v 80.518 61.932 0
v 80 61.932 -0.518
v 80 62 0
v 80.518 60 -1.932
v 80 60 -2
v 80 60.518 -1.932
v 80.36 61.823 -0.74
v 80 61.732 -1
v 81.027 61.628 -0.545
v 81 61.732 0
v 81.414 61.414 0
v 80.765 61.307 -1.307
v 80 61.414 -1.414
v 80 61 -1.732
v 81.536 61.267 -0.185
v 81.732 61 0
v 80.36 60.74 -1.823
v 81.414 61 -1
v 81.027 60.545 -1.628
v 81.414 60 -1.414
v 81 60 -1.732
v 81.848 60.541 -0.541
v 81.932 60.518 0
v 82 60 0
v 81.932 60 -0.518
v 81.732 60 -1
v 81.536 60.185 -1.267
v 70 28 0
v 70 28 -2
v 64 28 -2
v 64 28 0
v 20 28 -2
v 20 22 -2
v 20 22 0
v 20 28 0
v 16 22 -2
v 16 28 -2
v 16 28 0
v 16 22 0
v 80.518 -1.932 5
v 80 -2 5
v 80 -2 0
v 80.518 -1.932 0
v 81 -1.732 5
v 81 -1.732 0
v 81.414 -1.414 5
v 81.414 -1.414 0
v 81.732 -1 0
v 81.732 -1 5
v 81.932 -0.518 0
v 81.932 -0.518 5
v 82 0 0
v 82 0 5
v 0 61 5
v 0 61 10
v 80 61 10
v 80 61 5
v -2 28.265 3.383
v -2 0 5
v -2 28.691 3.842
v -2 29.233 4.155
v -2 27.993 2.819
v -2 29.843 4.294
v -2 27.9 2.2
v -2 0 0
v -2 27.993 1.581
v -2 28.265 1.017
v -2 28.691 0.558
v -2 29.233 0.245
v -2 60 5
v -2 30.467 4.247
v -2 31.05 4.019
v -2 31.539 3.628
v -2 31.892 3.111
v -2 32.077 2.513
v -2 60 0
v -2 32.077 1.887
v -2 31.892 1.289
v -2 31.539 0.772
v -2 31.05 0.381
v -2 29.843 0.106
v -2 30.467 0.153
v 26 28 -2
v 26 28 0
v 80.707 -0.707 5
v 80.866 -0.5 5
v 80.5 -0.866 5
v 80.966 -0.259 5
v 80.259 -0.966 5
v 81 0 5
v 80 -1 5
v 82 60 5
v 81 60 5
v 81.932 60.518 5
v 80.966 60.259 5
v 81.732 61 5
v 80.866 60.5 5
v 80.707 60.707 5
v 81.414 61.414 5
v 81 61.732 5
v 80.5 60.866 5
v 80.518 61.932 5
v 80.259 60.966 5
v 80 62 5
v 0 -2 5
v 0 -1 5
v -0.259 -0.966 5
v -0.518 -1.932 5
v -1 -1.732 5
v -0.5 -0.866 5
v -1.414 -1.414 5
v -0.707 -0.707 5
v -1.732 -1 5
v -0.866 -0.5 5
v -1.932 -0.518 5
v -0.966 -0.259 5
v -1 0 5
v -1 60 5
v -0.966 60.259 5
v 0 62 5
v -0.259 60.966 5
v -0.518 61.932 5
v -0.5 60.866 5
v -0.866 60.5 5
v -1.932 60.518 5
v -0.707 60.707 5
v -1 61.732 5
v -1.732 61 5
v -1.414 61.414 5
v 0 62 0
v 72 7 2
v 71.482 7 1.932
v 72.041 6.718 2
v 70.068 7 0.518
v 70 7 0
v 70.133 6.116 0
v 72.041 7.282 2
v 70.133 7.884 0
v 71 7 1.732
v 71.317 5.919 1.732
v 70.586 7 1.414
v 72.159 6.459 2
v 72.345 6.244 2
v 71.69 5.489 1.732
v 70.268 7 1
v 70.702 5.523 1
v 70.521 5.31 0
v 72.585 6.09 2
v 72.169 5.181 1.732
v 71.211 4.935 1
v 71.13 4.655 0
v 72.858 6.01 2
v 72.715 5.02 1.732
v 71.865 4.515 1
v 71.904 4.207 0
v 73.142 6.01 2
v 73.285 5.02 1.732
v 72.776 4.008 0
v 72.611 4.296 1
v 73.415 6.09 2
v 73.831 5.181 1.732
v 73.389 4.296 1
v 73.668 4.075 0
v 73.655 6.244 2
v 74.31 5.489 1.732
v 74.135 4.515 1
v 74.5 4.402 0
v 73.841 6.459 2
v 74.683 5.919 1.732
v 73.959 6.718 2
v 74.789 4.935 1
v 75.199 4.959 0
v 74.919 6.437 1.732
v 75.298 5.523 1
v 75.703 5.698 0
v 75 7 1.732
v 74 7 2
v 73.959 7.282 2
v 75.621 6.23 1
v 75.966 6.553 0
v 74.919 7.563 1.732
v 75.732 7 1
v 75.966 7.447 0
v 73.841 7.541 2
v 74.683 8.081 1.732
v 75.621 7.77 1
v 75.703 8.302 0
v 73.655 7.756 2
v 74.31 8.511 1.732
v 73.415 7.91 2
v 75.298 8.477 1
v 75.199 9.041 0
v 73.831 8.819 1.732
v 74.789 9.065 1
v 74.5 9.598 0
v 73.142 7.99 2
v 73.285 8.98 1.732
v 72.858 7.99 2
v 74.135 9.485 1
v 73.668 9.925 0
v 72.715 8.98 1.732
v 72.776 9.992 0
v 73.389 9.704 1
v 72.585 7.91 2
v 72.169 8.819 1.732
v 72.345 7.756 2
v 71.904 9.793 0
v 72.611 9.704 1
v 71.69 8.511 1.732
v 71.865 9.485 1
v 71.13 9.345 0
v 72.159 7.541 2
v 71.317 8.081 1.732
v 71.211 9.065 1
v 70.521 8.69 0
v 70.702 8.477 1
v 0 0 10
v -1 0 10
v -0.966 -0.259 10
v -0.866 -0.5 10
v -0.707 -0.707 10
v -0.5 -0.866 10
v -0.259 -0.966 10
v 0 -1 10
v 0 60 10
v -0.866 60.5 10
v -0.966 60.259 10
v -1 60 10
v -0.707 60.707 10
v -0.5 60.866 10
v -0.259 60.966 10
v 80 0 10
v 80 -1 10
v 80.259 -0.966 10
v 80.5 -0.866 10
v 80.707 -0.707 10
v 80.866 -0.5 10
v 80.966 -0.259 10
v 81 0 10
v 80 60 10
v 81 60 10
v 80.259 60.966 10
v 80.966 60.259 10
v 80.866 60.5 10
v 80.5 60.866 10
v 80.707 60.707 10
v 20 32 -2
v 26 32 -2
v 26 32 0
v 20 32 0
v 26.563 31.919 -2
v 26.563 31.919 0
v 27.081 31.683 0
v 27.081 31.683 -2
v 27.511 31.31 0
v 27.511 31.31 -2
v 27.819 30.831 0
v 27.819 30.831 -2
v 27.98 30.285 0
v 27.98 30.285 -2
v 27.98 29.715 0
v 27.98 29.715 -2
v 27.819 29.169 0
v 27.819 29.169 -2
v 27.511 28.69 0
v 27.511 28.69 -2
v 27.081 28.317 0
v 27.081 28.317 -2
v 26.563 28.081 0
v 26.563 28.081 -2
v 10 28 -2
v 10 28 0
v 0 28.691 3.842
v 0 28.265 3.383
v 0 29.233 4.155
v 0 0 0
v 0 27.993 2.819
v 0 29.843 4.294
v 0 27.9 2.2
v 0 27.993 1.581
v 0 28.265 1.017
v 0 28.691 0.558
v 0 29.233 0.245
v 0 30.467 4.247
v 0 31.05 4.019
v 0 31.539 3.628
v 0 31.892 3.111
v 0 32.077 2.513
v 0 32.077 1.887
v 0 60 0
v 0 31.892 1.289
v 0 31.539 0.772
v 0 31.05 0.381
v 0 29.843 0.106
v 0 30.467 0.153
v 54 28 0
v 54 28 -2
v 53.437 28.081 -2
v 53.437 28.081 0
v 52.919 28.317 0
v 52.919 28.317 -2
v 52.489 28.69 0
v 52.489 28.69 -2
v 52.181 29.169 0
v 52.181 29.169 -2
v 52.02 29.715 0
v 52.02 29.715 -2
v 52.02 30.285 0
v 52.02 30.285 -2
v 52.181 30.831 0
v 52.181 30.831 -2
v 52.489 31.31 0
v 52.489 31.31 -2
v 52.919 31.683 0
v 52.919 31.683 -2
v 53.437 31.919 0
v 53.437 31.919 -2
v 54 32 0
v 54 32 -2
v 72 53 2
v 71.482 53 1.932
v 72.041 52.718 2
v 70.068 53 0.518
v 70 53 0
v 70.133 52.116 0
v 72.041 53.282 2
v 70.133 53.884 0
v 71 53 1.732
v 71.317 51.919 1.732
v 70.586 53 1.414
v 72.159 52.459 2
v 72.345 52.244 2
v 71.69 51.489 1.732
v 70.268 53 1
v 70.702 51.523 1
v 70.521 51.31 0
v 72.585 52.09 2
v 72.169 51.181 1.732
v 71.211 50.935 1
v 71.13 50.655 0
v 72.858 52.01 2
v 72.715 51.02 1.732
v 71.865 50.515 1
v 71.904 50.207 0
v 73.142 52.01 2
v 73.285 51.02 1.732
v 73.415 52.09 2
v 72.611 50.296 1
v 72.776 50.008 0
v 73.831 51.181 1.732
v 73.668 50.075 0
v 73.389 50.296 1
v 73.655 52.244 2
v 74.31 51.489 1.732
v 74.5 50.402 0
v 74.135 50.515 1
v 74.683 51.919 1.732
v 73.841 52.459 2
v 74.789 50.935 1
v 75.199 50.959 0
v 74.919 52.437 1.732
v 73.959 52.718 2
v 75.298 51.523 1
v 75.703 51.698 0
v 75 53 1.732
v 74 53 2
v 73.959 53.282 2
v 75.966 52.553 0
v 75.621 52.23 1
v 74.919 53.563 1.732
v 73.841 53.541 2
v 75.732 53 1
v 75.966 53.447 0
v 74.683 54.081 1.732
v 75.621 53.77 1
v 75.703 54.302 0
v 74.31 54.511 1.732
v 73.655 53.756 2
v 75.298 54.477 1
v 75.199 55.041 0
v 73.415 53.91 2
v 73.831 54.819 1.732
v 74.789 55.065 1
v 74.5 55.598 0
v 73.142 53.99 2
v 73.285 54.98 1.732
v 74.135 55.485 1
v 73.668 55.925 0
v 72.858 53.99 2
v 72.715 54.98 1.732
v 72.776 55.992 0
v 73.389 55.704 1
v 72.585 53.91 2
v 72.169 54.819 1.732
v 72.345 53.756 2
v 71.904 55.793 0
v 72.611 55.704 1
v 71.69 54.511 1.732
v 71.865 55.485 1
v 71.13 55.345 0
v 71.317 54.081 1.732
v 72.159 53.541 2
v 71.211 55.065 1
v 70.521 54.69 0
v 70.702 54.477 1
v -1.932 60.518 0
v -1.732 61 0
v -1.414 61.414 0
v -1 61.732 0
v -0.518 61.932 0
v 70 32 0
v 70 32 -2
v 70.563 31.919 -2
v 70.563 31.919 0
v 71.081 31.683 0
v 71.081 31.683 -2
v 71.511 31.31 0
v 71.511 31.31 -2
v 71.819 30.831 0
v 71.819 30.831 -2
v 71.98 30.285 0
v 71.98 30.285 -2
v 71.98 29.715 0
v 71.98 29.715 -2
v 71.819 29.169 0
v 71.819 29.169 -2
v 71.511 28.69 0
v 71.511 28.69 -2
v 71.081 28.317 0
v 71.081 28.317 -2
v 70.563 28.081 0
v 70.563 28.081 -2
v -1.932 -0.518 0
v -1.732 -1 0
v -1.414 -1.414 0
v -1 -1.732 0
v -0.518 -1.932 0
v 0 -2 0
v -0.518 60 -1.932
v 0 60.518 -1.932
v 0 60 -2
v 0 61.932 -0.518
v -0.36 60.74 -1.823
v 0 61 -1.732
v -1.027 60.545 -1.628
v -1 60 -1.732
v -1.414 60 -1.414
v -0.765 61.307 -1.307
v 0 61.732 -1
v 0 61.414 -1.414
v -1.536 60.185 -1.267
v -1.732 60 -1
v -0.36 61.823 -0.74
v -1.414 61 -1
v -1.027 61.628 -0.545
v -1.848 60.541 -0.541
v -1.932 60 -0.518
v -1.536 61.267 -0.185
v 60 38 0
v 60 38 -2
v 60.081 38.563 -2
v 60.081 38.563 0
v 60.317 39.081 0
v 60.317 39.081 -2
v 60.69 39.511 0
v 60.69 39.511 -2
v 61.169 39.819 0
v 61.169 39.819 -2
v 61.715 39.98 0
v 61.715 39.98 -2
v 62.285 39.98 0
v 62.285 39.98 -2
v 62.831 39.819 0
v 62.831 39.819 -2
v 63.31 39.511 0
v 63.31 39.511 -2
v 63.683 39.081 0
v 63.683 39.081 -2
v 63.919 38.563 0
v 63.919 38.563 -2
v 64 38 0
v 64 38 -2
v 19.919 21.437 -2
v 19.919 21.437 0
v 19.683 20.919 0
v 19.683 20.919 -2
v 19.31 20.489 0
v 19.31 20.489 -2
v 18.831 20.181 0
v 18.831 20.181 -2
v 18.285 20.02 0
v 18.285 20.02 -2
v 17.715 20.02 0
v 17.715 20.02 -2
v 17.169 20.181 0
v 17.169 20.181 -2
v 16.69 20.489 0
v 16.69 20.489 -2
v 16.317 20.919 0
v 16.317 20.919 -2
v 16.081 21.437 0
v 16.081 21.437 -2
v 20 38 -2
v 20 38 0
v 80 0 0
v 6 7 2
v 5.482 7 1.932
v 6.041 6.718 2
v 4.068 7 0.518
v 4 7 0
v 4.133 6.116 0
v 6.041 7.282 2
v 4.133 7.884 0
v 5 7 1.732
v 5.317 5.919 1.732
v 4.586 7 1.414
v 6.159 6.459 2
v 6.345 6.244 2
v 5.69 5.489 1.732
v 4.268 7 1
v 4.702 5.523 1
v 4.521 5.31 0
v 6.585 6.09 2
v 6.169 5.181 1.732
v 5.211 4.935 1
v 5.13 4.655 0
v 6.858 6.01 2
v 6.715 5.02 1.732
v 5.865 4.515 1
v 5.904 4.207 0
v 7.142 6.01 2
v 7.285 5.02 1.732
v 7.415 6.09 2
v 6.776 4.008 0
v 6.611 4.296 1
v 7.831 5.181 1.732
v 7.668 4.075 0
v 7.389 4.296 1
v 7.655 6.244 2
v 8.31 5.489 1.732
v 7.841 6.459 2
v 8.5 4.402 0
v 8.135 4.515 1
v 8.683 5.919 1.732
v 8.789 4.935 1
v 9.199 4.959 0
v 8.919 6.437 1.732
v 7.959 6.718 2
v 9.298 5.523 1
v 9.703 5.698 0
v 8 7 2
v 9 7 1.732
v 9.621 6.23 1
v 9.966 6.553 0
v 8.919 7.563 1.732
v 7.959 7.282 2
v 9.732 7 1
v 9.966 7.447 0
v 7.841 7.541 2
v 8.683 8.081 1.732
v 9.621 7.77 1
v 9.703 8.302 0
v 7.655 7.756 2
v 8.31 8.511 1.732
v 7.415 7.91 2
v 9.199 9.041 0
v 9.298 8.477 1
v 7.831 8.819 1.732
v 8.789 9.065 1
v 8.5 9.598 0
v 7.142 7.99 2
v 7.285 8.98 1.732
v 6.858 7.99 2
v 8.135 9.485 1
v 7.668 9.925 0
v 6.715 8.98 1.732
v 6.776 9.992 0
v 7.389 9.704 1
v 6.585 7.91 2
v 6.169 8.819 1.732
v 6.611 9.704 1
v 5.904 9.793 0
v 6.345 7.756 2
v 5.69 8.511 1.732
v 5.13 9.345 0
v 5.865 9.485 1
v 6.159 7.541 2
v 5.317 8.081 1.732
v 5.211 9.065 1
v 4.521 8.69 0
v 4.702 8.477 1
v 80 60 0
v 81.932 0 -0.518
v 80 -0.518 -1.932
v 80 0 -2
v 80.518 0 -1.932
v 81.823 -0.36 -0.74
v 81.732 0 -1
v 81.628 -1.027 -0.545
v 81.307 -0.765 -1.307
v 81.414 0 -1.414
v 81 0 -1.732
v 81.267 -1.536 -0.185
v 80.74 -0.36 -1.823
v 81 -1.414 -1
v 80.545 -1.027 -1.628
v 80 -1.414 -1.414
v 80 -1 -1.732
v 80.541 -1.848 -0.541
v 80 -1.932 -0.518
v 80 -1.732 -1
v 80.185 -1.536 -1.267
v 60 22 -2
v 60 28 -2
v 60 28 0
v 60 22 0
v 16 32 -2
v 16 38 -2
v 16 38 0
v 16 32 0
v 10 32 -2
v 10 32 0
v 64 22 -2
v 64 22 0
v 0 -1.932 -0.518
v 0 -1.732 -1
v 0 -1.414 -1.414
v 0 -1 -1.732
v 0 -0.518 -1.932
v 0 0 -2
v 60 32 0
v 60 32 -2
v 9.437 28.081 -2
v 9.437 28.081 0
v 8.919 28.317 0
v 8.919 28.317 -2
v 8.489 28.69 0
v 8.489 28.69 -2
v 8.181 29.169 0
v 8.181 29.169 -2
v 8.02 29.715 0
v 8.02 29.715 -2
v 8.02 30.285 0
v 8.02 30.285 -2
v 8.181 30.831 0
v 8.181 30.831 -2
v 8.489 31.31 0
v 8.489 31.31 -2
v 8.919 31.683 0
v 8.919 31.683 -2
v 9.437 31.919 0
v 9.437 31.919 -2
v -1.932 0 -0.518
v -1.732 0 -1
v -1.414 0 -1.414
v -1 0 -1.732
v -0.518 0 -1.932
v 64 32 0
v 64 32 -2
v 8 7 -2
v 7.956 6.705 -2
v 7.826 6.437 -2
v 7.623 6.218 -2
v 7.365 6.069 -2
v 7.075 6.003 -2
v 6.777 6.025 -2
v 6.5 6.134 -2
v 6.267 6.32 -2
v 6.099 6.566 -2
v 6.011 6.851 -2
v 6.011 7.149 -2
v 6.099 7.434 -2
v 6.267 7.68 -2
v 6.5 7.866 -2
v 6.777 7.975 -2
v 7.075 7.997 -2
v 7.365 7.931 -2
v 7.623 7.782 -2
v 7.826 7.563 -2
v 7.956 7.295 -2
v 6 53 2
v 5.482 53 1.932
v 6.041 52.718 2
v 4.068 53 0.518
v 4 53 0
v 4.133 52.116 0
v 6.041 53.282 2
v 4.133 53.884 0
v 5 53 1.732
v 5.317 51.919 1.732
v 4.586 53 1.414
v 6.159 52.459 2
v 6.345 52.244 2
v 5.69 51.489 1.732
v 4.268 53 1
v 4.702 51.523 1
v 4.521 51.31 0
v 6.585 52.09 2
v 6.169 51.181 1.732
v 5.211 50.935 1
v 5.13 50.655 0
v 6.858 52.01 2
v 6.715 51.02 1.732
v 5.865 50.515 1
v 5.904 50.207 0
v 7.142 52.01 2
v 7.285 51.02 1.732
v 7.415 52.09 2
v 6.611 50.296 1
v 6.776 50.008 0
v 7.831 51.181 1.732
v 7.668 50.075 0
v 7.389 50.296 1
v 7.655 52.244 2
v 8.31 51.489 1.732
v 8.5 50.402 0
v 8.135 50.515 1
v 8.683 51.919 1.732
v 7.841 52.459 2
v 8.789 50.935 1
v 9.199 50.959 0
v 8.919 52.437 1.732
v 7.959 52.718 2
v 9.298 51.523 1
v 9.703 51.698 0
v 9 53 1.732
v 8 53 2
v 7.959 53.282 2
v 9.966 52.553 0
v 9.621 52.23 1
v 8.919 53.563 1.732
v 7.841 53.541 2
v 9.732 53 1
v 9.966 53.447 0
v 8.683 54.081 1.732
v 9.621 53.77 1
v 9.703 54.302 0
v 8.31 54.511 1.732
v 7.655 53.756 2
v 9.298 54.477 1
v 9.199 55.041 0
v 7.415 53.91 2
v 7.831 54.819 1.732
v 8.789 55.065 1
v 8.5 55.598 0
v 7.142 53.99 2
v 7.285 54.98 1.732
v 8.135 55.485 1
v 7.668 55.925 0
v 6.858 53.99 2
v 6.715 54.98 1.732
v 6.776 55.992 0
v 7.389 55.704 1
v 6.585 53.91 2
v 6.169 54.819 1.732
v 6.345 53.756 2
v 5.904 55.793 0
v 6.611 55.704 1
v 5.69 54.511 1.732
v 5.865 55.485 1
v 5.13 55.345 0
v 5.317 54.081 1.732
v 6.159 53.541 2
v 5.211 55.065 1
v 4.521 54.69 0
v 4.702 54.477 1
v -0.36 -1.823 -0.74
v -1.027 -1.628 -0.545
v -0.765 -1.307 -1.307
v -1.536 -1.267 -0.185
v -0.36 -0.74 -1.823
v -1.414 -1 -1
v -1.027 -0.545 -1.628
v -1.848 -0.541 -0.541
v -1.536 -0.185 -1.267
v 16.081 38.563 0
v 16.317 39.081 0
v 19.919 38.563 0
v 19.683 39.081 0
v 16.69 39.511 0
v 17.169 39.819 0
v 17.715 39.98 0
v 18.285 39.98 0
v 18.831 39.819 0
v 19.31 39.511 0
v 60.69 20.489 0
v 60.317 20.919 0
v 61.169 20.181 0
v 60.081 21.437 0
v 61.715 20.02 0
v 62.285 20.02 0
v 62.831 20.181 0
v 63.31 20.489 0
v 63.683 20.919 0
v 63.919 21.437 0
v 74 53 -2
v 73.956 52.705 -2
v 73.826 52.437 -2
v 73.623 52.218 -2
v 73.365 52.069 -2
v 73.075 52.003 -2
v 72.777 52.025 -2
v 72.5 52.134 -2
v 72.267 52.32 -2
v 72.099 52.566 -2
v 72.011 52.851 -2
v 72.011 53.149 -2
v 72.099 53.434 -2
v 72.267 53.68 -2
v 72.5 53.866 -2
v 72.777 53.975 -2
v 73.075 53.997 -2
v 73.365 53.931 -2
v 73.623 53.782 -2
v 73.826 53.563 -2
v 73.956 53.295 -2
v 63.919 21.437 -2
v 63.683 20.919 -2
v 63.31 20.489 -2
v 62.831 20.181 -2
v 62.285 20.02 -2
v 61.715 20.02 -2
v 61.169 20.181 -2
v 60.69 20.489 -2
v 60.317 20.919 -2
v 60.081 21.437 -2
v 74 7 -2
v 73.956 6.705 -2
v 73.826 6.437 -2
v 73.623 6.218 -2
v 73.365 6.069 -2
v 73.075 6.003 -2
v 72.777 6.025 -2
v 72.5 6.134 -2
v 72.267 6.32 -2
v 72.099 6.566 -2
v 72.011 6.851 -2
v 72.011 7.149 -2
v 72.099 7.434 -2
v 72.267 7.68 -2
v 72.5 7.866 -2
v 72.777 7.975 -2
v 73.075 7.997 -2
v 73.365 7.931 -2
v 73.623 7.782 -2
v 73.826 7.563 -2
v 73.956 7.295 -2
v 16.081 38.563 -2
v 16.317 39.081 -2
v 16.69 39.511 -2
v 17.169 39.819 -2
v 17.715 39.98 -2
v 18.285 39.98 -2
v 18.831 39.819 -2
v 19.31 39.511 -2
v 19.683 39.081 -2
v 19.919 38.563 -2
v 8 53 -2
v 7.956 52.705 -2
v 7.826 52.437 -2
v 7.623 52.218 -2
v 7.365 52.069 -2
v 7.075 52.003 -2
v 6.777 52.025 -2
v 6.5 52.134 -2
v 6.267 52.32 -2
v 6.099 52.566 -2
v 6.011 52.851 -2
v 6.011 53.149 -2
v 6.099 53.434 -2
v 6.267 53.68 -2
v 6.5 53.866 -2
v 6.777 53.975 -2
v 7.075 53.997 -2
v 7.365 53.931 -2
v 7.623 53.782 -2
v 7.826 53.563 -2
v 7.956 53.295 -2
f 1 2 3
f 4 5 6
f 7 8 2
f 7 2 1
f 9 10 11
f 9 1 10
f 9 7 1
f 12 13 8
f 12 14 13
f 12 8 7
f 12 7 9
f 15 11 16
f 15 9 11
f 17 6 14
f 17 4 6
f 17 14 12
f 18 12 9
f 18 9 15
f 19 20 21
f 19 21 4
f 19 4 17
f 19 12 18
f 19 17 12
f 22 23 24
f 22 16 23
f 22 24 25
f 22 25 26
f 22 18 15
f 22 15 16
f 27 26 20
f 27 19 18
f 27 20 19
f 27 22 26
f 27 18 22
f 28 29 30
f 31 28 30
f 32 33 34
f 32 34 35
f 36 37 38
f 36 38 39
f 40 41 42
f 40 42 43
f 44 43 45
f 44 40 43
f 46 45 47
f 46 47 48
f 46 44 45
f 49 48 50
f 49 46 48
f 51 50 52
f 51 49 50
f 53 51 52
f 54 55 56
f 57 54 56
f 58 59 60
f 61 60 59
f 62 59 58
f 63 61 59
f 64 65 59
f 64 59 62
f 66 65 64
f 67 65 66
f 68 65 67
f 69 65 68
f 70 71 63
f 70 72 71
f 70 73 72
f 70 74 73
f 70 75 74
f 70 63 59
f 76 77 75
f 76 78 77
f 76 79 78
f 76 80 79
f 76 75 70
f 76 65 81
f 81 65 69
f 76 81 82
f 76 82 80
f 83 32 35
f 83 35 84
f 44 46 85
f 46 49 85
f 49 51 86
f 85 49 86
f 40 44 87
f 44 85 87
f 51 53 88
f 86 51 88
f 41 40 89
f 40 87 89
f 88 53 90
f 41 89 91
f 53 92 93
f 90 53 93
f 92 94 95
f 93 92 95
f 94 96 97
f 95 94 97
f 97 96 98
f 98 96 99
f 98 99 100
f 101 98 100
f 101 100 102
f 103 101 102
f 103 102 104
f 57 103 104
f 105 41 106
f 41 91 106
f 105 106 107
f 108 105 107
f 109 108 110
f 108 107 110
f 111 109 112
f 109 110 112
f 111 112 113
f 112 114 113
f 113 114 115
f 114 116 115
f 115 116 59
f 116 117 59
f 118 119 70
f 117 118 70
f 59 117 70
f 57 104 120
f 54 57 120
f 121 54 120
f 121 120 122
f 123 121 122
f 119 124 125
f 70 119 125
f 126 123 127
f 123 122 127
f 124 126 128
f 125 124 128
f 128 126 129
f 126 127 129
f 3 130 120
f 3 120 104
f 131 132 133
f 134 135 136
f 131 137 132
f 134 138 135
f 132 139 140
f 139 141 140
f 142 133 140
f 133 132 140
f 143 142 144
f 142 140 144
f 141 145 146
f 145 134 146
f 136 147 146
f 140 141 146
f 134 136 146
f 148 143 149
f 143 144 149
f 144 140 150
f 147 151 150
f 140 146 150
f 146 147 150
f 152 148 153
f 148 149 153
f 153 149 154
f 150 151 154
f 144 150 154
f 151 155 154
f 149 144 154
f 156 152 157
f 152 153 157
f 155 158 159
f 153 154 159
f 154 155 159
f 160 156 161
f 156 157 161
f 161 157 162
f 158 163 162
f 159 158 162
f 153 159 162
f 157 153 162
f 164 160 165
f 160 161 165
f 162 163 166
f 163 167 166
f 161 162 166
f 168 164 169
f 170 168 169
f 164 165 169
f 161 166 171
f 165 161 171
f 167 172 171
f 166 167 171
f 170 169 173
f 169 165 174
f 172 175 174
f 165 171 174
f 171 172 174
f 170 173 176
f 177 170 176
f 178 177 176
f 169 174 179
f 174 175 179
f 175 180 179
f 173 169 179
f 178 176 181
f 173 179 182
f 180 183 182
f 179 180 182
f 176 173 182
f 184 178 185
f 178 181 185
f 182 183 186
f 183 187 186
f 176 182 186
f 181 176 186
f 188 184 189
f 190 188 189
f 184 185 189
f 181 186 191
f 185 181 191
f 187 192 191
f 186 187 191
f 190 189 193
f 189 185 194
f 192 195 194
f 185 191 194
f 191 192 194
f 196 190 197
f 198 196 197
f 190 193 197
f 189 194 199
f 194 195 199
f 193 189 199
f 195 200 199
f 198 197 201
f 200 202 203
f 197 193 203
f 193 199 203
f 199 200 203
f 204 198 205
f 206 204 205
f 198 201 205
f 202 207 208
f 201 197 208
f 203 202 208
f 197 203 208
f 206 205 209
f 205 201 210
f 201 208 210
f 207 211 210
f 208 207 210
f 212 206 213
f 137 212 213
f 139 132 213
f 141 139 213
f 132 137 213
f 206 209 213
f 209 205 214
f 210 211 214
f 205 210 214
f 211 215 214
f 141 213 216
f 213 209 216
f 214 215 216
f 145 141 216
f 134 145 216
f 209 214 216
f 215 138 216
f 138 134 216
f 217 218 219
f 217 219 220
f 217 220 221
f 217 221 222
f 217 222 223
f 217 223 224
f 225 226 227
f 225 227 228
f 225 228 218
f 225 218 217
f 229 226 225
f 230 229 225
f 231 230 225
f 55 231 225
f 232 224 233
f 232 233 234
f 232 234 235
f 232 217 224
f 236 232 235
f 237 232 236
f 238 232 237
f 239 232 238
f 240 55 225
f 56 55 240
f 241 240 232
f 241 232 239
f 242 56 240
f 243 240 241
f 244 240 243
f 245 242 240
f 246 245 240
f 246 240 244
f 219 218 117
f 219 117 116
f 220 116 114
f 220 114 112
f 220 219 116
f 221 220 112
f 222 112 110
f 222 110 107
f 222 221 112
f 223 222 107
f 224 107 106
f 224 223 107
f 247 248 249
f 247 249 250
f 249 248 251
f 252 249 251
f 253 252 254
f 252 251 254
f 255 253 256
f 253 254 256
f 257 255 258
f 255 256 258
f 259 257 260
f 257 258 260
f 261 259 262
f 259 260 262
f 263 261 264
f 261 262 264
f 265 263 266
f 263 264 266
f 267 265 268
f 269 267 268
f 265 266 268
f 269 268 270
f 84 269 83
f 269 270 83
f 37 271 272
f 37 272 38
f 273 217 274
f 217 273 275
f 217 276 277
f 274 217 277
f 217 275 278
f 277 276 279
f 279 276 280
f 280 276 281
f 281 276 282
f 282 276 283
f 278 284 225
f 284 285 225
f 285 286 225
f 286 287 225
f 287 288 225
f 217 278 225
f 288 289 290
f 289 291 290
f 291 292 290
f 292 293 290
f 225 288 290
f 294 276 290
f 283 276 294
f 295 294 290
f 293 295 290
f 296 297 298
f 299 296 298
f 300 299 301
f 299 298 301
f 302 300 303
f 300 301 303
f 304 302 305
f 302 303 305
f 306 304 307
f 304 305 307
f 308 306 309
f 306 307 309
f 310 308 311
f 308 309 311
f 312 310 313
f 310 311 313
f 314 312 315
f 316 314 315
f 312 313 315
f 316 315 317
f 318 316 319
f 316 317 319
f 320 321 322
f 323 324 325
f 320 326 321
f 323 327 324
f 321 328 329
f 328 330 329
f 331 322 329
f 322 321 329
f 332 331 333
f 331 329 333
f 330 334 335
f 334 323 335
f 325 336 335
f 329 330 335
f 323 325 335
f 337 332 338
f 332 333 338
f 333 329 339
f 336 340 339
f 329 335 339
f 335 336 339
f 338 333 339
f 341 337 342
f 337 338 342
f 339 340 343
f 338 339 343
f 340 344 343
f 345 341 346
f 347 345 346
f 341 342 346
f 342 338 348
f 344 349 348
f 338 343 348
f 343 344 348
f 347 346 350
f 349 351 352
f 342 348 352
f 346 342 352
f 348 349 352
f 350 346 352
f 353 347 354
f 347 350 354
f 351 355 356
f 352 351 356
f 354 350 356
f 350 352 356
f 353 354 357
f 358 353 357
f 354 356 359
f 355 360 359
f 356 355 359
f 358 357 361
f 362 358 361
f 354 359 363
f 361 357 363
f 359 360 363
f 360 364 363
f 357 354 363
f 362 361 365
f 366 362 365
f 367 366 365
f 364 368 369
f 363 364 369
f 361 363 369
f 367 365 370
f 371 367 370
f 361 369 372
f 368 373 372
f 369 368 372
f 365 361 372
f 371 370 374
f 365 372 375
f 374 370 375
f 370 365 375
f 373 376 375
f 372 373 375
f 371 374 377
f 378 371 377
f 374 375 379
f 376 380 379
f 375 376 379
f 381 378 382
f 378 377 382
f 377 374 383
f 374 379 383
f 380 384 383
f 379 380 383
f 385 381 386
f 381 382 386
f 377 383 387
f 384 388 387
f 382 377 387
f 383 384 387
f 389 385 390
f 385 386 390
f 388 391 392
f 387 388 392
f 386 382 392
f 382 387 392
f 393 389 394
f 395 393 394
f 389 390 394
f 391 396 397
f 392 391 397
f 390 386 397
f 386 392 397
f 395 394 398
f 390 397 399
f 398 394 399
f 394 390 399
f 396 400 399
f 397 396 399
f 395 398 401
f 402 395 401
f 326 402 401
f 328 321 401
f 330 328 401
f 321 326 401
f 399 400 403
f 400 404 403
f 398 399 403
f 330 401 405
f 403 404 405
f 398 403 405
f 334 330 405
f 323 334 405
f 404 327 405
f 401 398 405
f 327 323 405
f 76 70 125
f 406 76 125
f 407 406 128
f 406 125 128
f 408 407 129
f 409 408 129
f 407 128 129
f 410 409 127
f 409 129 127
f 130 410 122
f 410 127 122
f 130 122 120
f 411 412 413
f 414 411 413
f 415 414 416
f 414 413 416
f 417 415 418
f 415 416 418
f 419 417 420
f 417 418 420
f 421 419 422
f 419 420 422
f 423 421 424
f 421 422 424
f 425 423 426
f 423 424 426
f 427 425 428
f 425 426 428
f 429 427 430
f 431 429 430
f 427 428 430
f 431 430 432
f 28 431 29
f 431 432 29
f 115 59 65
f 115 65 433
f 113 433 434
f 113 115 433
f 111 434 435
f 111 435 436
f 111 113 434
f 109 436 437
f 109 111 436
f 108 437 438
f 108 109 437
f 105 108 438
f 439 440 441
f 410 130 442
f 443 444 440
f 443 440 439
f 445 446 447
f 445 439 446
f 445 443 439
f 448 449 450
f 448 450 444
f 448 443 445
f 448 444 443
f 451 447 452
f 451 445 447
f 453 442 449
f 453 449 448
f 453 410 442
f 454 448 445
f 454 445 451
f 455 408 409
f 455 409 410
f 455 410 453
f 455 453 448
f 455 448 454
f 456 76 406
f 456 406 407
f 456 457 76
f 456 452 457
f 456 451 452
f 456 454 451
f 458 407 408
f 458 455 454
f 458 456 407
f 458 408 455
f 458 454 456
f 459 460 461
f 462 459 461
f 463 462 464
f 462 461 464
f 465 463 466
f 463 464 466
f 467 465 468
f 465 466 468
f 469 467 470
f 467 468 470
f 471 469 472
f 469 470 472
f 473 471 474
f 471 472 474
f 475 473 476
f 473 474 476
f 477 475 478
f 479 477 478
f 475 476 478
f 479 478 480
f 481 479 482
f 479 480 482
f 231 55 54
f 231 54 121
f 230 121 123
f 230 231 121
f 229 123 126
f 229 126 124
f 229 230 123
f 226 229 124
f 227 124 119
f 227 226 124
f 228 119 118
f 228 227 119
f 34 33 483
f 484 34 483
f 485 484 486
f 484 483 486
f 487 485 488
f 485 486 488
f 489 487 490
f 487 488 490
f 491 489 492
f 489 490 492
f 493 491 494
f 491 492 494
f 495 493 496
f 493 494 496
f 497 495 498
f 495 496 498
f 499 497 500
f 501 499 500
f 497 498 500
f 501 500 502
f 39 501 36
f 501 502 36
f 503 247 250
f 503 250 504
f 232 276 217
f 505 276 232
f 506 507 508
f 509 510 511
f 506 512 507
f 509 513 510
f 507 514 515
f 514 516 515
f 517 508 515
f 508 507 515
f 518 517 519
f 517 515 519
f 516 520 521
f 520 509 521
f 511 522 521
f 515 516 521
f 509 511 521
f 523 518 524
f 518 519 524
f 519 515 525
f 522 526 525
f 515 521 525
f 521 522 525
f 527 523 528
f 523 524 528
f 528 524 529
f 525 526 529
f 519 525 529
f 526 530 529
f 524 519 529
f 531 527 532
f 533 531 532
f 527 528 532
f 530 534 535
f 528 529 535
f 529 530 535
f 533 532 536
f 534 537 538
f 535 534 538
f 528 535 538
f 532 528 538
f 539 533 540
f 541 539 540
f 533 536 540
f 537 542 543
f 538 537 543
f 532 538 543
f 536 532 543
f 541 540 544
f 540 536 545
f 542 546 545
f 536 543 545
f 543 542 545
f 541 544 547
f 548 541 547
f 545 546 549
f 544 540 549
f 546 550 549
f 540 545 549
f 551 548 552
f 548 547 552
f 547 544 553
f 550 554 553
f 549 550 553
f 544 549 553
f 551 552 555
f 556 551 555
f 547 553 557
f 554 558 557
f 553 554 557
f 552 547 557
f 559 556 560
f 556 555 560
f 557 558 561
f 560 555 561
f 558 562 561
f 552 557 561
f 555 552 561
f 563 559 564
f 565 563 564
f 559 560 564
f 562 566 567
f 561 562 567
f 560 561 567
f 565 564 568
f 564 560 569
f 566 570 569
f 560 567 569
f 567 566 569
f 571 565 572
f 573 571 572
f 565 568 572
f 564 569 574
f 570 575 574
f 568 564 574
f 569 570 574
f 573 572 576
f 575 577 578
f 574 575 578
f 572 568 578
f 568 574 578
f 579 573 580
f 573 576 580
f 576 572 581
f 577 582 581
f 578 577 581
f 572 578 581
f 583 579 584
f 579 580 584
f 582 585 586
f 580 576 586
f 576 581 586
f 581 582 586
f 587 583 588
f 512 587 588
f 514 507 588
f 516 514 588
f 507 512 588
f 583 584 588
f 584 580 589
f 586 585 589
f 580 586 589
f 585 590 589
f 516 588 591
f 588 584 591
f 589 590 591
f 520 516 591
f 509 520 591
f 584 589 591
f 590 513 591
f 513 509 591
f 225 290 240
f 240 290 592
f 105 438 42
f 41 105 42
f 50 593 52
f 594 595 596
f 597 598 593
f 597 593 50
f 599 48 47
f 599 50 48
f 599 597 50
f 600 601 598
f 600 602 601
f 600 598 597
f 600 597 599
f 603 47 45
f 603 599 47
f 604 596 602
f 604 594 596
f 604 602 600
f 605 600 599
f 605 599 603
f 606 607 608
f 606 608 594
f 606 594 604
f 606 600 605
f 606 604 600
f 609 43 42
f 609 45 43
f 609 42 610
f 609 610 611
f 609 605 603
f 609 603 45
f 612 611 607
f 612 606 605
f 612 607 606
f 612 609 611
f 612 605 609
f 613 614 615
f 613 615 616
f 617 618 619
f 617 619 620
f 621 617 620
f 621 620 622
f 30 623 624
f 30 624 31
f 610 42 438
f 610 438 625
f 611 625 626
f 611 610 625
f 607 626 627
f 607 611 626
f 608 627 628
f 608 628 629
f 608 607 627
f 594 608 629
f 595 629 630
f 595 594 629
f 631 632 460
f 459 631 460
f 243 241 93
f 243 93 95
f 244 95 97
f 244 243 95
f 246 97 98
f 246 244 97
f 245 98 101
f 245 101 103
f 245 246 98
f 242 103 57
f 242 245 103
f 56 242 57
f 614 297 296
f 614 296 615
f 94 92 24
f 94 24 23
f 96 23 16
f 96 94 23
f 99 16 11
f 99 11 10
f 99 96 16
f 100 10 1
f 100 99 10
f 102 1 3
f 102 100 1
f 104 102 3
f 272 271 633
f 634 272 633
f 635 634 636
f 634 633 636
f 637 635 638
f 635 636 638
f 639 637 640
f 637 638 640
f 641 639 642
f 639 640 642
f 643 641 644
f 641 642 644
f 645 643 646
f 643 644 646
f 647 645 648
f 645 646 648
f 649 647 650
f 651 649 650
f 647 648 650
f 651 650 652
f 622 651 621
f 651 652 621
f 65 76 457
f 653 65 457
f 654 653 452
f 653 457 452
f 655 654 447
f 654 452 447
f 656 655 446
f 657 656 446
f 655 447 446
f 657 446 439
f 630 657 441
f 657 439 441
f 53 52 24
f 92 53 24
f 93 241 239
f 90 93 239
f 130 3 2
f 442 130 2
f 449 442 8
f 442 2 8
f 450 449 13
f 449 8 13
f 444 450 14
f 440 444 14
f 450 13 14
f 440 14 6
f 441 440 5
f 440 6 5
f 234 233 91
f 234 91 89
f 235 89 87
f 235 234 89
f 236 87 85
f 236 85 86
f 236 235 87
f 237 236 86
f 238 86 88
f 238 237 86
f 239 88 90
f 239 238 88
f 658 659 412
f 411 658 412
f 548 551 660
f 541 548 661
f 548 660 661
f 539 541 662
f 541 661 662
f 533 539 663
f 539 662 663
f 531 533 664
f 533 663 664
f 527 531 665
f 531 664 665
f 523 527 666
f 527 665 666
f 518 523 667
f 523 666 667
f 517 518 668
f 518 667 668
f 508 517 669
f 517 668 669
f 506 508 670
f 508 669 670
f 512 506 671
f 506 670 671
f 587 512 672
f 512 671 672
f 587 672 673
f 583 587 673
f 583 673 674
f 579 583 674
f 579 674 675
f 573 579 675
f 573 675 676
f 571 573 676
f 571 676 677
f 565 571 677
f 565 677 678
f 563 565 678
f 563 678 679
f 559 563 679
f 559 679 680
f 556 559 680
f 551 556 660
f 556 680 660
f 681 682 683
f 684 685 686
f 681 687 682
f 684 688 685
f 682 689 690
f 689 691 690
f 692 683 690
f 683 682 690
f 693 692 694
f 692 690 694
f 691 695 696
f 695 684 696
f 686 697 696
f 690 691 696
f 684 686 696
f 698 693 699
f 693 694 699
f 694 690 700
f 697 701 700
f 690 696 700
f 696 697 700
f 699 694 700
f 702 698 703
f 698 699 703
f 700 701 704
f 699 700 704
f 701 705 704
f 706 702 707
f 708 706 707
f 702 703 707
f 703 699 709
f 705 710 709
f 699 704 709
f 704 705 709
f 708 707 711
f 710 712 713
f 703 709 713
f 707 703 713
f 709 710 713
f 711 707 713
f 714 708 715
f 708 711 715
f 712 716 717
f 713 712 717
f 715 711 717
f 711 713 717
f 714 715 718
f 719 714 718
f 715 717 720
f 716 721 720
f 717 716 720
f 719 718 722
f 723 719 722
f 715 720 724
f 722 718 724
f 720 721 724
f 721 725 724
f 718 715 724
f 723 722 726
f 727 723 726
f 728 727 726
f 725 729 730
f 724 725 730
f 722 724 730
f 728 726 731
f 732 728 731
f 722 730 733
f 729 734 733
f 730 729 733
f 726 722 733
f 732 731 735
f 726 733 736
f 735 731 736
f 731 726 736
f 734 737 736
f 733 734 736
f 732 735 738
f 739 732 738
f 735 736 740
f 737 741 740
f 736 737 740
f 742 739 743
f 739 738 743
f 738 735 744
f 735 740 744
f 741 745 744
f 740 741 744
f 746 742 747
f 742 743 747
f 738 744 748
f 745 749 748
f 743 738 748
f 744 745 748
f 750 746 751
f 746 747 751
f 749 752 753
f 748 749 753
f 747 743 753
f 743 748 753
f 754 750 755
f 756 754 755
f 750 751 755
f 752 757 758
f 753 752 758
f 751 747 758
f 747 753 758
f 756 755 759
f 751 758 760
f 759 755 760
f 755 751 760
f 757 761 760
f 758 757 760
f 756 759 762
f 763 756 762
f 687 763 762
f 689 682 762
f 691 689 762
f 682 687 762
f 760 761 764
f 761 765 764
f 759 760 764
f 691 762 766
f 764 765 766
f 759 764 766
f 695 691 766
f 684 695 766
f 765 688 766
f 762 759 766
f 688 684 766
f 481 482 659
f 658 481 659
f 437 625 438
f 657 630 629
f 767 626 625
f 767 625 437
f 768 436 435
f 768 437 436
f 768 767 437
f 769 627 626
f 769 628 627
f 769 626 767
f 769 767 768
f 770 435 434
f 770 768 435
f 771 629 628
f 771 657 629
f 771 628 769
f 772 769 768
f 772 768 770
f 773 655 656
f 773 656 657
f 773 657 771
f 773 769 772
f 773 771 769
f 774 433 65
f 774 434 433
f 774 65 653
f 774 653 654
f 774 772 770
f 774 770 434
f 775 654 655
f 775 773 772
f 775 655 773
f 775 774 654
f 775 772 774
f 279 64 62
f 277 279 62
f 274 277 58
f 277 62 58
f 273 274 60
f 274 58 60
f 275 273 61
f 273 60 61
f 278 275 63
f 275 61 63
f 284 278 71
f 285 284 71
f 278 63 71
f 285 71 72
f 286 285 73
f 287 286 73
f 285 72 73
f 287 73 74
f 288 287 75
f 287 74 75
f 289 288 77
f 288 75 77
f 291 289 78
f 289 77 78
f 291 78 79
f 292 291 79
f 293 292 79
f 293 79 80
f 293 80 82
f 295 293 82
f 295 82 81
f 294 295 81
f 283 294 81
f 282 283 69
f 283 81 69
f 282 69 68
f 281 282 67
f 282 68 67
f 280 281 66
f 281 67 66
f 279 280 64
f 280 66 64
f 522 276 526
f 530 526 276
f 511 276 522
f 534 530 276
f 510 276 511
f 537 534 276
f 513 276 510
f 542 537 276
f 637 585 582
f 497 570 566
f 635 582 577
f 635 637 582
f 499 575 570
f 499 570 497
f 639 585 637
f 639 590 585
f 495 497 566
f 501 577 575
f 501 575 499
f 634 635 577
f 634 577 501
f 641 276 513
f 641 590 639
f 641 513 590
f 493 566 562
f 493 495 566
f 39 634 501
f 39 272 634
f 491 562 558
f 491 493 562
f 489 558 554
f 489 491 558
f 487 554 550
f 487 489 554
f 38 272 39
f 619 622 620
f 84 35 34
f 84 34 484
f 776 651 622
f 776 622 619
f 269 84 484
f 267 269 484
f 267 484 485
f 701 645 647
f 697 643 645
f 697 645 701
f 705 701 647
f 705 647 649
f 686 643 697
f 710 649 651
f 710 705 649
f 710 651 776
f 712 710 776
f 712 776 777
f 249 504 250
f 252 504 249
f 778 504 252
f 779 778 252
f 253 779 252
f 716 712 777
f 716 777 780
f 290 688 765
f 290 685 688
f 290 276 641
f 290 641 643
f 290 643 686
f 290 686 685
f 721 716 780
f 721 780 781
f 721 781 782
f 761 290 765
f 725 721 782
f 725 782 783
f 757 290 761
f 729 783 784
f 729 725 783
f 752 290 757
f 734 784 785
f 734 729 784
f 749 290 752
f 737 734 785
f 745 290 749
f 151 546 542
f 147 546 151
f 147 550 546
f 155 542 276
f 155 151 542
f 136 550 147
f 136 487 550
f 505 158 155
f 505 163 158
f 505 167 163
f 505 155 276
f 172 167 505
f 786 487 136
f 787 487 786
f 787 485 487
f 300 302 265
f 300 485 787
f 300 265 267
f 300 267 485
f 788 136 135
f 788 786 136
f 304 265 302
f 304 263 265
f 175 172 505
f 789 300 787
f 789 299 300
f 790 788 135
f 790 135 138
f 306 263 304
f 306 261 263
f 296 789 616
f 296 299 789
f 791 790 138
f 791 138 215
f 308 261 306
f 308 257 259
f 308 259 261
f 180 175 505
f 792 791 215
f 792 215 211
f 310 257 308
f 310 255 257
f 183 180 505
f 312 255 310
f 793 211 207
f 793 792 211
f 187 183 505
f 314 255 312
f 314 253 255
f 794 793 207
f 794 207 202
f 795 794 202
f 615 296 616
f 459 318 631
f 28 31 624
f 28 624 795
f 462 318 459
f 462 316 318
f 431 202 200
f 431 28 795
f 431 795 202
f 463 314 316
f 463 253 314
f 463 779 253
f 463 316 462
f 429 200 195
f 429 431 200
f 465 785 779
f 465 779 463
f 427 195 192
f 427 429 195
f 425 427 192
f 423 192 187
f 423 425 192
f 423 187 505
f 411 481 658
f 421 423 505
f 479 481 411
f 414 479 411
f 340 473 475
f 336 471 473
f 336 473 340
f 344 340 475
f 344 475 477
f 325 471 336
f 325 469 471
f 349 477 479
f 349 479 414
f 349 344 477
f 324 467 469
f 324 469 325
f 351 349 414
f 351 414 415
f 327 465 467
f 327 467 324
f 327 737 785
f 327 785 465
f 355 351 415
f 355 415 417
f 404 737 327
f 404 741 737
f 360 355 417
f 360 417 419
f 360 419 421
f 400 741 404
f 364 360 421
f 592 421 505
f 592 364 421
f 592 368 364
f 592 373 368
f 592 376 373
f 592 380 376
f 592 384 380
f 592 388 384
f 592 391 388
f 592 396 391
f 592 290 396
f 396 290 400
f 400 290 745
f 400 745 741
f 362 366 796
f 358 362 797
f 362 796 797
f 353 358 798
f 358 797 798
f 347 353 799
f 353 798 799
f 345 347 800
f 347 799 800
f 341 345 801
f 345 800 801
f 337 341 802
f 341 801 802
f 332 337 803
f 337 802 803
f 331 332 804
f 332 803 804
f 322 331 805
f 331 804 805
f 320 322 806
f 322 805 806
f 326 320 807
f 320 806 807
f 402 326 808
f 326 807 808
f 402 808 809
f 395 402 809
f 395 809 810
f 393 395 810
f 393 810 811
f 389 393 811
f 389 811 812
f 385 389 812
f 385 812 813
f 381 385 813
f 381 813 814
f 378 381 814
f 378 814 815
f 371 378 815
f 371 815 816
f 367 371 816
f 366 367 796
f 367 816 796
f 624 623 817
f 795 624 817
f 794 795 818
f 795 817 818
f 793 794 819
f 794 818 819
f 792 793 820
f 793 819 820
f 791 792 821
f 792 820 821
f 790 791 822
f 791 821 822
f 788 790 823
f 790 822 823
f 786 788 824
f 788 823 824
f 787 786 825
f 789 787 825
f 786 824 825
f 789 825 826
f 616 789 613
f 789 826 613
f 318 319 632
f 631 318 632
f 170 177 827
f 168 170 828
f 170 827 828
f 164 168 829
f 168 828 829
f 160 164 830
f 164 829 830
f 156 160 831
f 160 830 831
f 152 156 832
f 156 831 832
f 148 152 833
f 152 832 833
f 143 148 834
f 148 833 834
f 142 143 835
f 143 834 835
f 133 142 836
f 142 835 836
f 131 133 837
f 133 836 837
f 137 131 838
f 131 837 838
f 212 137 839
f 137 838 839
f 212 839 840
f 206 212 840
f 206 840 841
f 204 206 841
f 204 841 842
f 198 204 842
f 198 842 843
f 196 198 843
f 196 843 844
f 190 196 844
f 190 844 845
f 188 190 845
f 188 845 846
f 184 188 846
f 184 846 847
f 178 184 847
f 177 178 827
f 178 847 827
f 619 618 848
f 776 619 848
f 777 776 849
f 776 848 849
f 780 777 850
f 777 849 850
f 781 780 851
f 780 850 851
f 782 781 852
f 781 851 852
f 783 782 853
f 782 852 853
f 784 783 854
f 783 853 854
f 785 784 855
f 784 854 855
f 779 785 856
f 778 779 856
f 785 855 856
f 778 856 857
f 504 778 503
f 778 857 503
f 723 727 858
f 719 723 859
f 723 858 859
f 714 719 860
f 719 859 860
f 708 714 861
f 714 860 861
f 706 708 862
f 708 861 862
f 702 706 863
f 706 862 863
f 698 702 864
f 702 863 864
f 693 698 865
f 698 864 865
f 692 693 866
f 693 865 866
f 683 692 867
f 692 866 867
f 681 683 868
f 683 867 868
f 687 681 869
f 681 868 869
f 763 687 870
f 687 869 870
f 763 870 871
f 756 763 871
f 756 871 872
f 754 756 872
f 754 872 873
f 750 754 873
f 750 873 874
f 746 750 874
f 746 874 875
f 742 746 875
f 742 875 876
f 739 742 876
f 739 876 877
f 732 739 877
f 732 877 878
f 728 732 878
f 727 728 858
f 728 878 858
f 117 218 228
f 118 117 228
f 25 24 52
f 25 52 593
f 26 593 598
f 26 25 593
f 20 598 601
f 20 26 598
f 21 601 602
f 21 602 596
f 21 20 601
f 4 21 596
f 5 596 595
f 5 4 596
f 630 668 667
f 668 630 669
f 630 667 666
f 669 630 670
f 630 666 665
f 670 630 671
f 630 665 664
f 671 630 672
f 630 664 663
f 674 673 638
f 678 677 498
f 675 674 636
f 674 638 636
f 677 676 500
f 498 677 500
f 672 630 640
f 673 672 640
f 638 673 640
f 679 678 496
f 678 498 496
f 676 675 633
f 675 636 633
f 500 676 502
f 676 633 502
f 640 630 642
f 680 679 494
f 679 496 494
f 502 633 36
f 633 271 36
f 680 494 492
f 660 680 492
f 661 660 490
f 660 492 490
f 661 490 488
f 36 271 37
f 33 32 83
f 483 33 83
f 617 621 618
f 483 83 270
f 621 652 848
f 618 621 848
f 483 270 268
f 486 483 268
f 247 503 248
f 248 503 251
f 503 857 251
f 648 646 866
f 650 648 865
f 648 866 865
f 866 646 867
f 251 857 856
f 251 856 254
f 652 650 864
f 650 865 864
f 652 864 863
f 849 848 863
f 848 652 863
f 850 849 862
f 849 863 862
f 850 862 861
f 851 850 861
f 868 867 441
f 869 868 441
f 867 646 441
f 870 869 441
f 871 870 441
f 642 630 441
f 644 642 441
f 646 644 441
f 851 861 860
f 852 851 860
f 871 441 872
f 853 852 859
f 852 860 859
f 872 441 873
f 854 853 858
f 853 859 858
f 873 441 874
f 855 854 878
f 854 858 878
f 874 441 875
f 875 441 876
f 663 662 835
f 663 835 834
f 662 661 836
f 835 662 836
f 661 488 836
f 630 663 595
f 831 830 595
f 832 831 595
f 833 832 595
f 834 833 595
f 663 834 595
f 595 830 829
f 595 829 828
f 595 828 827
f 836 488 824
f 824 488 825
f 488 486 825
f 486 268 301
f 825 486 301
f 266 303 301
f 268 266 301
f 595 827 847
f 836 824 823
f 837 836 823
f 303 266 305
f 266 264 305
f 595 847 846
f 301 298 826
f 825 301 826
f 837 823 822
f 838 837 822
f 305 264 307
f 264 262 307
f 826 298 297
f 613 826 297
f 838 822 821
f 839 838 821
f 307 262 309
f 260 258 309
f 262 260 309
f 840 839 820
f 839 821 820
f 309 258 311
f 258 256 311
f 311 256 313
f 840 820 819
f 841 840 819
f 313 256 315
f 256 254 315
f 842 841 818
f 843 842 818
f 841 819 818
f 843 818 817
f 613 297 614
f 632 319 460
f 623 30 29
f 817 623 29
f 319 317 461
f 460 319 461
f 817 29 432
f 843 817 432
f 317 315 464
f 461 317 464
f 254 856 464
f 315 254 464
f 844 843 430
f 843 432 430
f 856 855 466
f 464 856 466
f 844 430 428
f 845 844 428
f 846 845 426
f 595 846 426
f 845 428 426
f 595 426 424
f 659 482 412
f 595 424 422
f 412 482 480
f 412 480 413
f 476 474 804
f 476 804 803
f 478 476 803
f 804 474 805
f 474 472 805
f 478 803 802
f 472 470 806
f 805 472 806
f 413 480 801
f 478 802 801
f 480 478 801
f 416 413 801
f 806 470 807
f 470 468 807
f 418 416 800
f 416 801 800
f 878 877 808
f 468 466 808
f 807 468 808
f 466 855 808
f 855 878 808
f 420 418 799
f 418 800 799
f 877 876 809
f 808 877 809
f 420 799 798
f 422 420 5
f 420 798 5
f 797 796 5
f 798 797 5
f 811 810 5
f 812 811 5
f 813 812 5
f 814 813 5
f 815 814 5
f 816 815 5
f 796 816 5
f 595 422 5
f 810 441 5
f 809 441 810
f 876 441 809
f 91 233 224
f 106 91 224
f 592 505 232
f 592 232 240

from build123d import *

# Parameters (mm, degrees)
BOX_W           = 80
BOX_H           = 60
BOX_DEPTH       = 10
THICKNESS_T     = 2
POCKET_DEPTH    = 5
SKETCH006_R     = 1
POCKET001_DEPTH = 12.001
POCKET002_DEPTH = 12.001
SKETCH011_R     = 2.1
POCKET003_DEPTH = 2


with BuildPart() as standoff:
    # Sketch010 → Revolution (revolve)
    with BuildSketch(Plane.XZ):
        with BuildLine():
            ThreePointArc((-1, 2), (-2.414214, 1.414214), (-3, 0))
            Line((-3, 0), (0, 0))
            Line((0, 2), (0, 0))
            Line((-1, 2), (0, 2))
        make_face()
    revolve(axis=Axis((0, 0, 0), (0, 0, 1)))


with BuildPart() as standofftopleft:
    # Clone004 base: copy of StandOff
    add(standoff.part)


with BuildPart() as standofftopleft_1:
    # Clone004 placement: moved
    add(standofftopleft.part.moved(Location((7, 53, 0))))


with BuildPart() as standofftopright:
    # Clone005 base: copy of StandOff
    add(standoff.part)


with BuildPart() as standofftopright_1:
    # Clone005 placement: moved
    add(standofftopright.part.moved(Location((73, 53, 0))))


with BuildPart() as standoffbottomright:
    # Clone006 base: copy of StandOff
    add(standoff.part)


with BuildPart() as standoffbottomright_1:
    # Clone006 placement: moved
    add(standoffbottomright.part.moved(Location((73, 7, 0))))


with BuildPart() as standoffbottomleft:
    # Clone007 base: copy of StandOff
    add(standoff.part)


with BuildPart() as standoffbottomleft_1:
    # Clone007 placement: moved
    add(standoffbottomleft.part.moved(Location((7, 7, 0))))


with BuildPart() as bottomwithcablehole:
    # Box → Box (new body)
    with BuildSketch(Plane.XY):
        with Locations((40, 30)):
            Rectangle(BOX_W, BOX_H)
    extrude(amount=BOX_DEPTH)

    # Thickness
    thickness_openings = [bottomwithcablehole.faces().sort_by_distance(p)[0] for p in [
        (40, 30, 10),
    ]]
    offset(amount=THICKNESS_T, openings=thickness_openings)

    # Sketch004 → Pocket (cut)
    with BuildSketch(Plane.XY.offset(10)):
        with BuildLine():
            Line((0, 62), (80, 62))
            ThreePointArc((82, 60), (81.414214, 61.414214), (80, 62))
            Line((82, 60), (82, 0))
            ThreePointArc((80, -2), (81.414214, -1.414214), (82, 0))
            Line((80, -2), (0, -2))
            ThreePointArc((-2, 0), (-1.414214, -1.414214), (0, -2))
            Line((-2, 0), (-2, 60))
            ThreePointArc((0, 62), (-1.414214, 61.414214), (-2, 60))
        make_face()
        with BuildLine():
            Line((0, 61), (80, 61))
            ThreePointArc((81, 60), (80.707107, 60.707107), (80, 61))
            Line((81, 60), (81, 0))
            ThreePointArc((80, -1), (80.707107, -0.707107), (81, 0))
            Line((80, -1), (0, -1))
            ThreePointArc((-1, 0), (-0.707107, -0.707107), (0, -1))
            Line((-1, 0), (-1, 60))
            ThreePointArc((0, 61), (-0.707107, 60.707107), (-1, 60))
        make_face(mode=Mode.SUBTRACT)
    extrude(amount=-POCKET_DEPTH, mode=Mode.SUBTRACT)

    # Fusion002: union StandOffTopLeft, StandOffTopRight, StandOffBottomRight, StandOffBottomLeft
    add(standofftopleft_1.part)
    add(standofftopright_1.part)
    add(standoffbottomright_1.part)
    add(standoffbottomleft_1.part)

    # Sketch006 → Pocket001 (cut, through all)
    with BuildSketch(Plane(origin=(0, 0, -2), x_dir=(1, 0, 0), z_dir=(0, 0, -1))):
        with Locations((7, -7)):
            Circle(SKETCH006_R)
        with Locations((7, -53)):
            Circle(SKETCH006_R)
        with Locations((73, -53)):
            Circle(SKETCH006_R)
        with Locations((73, -7)):
            Circle(SKETCH006_R)
    extrude(amount=-POCKET001_DEPTH, mode=Mode.SUBTRACT)

    # Sketch009 → Pocket002 (cut, through all)
    with BuildSketch(Plane(origin=(0, 0, -2), x_dir=(1, 0, 0), z_dir=(0, 0, -1))):
        with BuildLine():
            Line((10, -28), (16, -28))
            Line((16, -28), (16, -22))
            ThreePointArc((20, -22), (18, -20), (16, -22))
            Line((20, -22), (20, -28))
            Line((20, -28), (26, -28))
            ThreePointArc((26, -32), (28, -30), (26, -28))
            Line((26, -32), (20, -32))
            Line((20, -32), (20, -38))
            ThreePointArc((16, -38), (18, -40), (20, -38))
            Line((16, -38), (16, -32))
            Line((16, -32), (10, -32))
            ThreePointArc((10, -28), (8, -30), (10, -32))
        make_face()
        with BuildLine():
            ThreePointArc((54, -28), (52, -30), (54, -32))
            Line((54, -32), (60, -32))
            Line((60, -32), (60, -38))
            ThreePointArc((60, -38), (62, -40), (64, -38))
            Line((64, -38), (64, -32))
            Line((64, -32), (70, -32))
            ThreePointArc((70, -32), (72, -30), (70, -28))
            Line((70, -28), (64, -28))
            Line((64, -22), (64, -28))
            ThreePointArc((64, -22), (62, -20), (60, -22))
            Line((60, -28), (60, -22))
            Line((54, -28), (60, -28))
        make_face()
    extrude(amount=-POCKET002_DEPTH, mode=Mode.SUBTRACT)

    # Sketch011 → Pocket003 (cut)
    with BuildSketch(Plane(origin=(-2, 0, 0), x_dir=(0, -1, 0), z_dir=(-1, 0, 0))):
        with Locations((-30, 2.2)):
            Circle(SKETCH011_R)
    extrude(amount=-POCKET003_DEPTH, mode=Mode.SUBTRACT)


solid = bottomwithcablehole.part
